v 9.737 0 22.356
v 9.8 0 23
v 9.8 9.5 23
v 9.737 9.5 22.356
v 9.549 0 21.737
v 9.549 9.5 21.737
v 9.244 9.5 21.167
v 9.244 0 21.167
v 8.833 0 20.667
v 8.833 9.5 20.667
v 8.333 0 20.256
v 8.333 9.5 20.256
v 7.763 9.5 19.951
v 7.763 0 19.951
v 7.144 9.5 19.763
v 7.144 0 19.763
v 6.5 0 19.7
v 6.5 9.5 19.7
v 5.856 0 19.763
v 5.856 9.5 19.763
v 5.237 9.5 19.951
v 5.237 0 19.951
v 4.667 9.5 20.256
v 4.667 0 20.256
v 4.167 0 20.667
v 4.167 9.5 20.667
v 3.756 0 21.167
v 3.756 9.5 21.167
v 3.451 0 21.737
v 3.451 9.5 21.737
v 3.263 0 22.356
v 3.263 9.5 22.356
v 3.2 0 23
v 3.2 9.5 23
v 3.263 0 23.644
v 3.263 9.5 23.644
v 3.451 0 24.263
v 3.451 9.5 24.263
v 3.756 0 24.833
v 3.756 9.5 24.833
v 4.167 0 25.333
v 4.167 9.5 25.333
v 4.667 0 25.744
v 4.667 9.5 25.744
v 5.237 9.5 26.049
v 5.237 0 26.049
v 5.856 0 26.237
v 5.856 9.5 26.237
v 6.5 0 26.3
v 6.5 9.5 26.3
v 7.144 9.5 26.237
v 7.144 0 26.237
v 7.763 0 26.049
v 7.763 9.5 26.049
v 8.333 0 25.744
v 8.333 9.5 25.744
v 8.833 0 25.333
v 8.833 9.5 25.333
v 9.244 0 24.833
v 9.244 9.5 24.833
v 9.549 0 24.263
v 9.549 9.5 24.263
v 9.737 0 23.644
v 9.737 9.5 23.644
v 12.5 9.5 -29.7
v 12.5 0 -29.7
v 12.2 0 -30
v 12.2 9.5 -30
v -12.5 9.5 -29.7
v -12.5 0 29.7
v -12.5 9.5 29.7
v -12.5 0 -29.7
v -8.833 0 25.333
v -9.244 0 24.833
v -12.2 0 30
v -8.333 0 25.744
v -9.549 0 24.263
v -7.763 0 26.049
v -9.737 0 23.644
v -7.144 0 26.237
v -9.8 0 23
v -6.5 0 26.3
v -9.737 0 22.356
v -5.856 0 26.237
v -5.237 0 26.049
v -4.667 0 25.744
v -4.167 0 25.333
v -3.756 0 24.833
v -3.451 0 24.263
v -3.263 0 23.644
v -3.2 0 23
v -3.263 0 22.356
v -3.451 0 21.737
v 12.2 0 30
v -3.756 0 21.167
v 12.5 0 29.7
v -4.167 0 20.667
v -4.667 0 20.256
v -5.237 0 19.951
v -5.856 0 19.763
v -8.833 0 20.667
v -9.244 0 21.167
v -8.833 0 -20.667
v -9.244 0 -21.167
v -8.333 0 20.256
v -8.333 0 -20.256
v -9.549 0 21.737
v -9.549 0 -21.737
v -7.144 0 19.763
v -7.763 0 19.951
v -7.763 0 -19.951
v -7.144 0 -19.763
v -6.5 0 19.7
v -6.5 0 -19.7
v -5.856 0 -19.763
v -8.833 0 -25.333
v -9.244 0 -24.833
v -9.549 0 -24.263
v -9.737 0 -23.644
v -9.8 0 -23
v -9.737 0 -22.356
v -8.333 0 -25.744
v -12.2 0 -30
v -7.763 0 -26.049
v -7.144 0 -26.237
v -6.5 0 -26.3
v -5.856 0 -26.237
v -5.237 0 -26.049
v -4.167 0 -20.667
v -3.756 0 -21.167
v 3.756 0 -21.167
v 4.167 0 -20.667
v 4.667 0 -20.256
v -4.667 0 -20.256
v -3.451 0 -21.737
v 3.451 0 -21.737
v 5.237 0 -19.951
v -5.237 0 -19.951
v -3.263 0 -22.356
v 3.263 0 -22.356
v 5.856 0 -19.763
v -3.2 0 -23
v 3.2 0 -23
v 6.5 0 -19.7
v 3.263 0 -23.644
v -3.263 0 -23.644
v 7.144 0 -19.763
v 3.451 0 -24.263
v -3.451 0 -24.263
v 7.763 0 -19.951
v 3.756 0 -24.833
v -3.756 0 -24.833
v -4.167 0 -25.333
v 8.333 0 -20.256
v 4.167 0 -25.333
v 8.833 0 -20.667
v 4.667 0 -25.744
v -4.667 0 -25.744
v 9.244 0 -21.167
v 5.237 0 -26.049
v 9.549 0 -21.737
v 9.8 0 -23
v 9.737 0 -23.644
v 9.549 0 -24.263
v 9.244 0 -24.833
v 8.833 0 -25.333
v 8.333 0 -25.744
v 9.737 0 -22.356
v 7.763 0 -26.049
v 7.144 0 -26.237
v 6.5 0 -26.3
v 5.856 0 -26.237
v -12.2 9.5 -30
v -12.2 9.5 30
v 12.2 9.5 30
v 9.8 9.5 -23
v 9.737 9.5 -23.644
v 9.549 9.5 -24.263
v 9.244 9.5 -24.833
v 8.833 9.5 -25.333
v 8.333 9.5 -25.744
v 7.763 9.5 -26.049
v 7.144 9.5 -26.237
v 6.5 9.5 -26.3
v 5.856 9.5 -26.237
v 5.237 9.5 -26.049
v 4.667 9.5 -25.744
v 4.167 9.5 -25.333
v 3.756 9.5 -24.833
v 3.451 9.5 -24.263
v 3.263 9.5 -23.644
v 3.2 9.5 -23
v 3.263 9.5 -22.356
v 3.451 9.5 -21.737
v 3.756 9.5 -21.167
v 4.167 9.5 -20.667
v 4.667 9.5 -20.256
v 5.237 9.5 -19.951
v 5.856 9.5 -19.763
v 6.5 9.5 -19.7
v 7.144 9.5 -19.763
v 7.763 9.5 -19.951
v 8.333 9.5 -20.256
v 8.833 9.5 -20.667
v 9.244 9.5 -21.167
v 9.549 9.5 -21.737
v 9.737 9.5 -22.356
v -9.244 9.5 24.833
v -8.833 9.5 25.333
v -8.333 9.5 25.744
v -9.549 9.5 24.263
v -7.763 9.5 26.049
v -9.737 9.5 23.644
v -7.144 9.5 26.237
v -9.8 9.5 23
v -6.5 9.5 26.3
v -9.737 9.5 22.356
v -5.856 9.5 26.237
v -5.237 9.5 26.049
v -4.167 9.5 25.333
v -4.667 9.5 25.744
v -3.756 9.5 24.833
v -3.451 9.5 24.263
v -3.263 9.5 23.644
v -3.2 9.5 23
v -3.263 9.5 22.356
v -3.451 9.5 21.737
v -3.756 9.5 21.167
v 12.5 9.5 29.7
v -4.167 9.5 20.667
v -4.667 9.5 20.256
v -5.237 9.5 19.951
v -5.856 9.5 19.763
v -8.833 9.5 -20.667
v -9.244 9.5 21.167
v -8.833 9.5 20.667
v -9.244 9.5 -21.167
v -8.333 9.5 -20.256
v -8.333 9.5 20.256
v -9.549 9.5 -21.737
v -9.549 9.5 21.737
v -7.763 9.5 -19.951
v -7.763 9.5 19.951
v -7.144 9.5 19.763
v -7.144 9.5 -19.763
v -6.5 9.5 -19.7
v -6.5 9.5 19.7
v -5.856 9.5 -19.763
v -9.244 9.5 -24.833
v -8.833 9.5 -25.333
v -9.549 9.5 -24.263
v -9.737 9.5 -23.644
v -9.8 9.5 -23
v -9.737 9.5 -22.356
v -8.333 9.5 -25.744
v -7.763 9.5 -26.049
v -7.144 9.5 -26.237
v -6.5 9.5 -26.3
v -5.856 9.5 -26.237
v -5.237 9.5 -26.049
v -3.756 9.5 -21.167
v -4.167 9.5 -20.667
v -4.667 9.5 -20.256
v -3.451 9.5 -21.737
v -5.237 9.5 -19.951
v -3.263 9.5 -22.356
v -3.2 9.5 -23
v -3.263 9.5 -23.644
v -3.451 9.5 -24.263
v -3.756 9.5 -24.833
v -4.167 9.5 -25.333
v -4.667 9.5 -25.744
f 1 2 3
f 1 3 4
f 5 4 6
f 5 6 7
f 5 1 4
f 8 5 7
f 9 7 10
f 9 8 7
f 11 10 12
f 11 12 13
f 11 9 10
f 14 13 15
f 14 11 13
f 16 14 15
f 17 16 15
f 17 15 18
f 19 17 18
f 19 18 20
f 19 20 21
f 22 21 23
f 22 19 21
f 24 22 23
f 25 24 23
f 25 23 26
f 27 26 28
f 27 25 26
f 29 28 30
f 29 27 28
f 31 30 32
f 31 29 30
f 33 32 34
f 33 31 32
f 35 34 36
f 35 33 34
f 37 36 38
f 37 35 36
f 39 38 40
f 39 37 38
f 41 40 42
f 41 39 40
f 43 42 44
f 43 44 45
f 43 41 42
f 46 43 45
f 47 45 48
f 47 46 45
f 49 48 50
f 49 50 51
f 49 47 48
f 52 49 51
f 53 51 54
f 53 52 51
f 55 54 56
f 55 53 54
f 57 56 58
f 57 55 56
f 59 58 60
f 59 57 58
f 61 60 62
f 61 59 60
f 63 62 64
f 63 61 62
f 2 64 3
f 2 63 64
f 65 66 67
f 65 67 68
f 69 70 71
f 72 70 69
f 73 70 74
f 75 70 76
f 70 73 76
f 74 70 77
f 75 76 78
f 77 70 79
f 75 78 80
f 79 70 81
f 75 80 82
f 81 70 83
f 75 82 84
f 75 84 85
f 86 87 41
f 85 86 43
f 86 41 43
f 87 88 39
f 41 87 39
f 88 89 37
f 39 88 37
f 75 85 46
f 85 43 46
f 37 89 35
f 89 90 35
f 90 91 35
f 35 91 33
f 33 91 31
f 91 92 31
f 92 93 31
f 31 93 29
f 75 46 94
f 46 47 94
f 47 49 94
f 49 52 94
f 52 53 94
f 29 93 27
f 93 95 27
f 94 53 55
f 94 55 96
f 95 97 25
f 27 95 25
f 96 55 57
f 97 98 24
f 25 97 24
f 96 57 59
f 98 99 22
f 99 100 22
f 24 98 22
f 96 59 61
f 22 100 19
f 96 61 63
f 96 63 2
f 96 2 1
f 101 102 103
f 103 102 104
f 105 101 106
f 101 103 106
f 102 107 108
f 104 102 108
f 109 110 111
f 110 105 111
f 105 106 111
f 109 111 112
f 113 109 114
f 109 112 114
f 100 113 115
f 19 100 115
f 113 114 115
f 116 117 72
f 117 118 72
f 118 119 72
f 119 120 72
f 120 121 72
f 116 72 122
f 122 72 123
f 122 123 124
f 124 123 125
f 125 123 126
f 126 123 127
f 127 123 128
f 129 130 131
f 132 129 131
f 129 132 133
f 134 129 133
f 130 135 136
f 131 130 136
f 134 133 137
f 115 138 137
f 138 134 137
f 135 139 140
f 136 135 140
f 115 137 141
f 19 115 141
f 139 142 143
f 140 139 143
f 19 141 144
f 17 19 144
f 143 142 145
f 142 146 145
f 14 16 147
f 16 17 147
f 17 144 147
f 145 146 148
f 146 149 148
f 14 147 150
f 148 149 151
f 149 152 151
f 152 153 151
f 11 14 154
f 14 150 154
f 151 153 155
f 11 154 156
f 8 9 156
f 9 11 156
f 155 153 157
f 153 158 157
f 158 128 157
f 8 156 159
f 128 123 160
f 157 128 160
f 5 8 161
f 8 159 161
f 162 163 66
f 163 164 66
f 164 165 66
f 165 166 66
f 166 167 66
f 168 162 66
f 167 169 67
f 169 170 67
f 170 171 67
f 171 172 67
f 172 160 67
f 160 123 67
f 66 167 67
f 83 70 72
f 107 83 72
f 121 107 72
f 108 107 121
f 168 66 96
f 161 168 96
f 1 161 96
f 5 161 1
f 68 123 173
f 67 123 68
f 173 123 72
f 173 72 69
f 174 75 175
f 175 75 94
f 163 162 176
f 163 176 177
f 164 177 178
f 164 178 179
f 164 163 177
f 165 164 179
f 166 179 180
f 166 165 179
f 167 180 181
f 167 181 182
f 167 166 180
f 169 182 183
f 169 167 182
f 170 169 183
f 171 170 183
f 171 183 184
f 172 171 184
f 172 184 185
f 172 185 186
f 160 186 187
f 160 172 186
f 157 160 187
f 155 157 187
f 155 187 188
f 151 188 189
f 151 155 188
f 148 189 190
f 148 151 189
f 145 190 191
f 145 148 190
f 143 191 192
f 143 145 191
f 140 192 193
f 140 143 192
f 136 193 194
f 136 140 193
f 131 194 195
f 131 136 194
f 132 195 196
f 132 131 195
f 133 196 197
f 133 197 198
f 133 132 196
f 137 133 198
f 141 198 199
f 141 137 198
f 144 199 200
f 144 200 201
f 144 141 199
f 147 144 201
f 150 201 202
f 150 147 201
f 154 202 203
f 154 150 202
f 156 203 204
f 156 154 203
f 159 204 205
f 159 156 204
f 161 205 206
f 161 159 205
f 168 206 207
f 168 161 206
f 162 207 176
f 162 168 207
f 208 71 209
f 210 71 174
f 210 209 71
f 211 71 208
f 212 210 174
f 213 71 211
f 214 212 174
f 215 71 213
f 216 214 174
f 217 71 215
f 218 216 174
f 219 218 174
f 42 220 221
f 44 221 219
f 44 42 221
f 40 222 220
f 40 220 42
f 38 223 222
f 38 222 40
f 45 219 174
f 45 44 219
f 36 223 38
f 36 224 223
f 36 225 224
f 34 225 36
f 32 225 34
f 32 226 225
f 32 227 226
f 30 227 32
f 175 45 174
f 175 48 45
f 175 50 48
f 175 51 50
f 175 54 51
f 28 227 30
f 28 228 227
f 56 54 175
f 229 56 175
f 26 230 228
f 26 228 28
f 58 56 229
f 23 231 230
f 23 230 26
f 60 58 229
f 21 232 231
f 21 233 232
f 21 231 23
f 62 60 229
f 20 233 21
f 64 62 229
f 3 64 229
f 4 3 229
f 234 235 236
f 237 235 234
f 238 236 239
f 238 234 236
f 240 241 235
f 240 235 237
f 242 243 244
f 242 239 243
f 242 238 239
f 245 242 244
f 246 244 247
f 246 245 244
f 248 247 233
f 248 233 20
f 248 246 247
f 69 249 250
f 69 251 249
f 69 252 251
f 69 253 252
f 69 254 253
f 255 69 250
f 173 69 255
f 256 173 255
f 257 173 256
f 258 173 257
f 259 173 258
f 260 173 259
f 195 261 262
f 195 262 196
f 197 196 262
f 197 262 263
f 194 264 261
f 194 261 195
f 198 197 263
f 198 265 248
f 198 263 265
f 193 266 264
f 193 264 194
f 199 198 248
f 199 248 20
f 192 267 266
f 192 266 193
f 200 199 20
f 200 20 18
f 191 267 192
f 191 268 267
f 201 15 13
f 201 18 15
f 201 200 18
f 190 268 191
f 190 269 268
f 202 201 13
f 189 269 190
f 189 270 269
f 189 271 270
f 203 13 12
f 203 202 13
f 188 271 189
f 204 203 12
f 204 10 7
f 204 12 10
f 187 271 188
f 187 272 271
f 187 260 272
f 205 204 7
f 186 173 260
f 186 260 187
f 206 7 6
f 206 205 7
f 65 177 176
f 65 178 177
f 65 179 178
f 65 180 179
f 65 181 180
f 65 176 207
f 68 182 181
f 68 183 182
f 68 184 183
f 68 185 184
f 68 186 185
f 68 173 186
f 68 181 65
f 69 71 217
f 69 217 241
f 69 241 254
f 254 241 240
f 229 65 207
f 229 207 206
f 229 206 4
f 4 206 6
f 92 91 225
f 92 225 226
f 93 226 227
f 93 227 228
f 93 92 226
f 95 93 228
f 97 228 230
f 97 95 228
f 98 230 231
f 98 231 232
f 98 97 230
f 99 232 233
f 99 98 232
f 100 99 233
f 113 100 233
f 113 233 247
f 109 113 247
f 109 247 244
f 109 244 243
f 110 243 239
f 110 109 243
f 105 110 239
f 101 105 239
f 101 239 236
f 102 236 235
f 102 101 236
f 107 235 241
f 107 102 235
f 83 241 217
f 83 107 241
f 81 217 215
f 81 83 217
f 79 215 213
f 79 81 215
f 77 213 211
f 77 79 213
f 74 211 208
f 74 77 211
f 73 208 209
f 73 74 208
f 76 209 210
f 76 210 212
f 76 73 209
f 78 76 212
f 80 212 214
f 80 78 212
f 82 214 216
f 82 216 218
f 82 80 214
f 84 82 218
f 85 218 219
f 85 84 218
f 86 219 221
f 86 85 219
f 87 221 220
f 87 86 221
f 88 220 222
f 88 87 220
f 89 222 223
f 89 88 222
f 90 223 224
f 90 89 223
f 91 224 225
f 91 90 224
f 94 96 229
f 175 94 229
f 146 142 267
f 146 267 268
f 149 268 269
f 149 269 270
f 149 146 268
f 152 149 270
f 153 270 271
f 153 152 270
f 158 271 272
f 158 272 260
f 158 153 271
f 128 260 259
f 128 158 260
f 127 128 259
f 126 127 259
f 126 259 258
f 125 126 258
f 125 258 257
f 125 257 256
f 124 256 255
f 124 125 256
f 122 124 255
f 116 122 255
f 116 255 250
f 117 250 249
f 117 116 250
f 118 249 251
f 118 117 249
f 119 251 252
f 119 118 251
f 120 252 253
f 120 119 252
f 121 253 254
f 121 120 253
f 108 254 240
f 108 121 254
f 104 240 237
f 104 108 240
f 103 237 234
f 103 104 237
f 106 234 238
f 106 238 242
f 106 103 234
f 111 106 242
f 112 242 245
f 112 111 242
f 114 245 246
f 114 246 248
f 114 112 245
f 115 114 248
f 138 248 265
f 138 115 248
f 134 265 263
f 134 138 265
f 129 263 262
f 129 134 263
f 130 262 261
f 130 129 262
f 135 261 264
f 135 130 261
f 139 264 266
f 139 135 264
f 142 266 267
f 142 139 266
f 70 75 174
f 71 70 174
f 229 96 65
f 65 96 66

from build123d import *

# Parameters (mm, degrees)
SKETCH1_W           = 25
SKETCH1_H           = 60
SKETCH1_R           = 3.3
BOSS_EXTRUDE1_DEPTH = 9.5
CHAMFER1_SIZE       = 0.3


with BuildPart() as part:
    # Sketch1 → Boss-Extrude1 (new body)
    with BuildSketch(Plane(origin=(0, 0, 0), x_dir=(1, 0, 0), z_dir=(0, 1, 0))):
        Rectangle(SKETCH1_W, SKETCH1_H)
        with Locations((6.5, 23)):
            Circle(SKETCH1_R, mode=Mode.SUBTRACT)
        with Locations((6.5, -23)):
            Circle(SKETCH1_R, mode=Mode.SUBTRACT)
        with Locations((-6.5, 23)):
            Circle(SKETCH1_R, mode=Mode.SUBTRACT)
        with Locations((-6.5, -23)):
            Circle(SKETCH1_R, mode=Mode.SUBTRACT)
    extrude(amount=BOSS_EXTRUDE1_DEPTH)

    # Chamfer1
    chamfer1_edges = [part.edges().sort_by_distance(p)[0] for p in [
        (-12.5, 4.75, -30),
        (12.5, 4.75, -30),
        (12.5, 4.75, 30),
        (-12.5, 4.75, 30),
    ]]
    chamfer(chamfer1_edges, length=CHAMFER1_SIZE)


solid = part.part
